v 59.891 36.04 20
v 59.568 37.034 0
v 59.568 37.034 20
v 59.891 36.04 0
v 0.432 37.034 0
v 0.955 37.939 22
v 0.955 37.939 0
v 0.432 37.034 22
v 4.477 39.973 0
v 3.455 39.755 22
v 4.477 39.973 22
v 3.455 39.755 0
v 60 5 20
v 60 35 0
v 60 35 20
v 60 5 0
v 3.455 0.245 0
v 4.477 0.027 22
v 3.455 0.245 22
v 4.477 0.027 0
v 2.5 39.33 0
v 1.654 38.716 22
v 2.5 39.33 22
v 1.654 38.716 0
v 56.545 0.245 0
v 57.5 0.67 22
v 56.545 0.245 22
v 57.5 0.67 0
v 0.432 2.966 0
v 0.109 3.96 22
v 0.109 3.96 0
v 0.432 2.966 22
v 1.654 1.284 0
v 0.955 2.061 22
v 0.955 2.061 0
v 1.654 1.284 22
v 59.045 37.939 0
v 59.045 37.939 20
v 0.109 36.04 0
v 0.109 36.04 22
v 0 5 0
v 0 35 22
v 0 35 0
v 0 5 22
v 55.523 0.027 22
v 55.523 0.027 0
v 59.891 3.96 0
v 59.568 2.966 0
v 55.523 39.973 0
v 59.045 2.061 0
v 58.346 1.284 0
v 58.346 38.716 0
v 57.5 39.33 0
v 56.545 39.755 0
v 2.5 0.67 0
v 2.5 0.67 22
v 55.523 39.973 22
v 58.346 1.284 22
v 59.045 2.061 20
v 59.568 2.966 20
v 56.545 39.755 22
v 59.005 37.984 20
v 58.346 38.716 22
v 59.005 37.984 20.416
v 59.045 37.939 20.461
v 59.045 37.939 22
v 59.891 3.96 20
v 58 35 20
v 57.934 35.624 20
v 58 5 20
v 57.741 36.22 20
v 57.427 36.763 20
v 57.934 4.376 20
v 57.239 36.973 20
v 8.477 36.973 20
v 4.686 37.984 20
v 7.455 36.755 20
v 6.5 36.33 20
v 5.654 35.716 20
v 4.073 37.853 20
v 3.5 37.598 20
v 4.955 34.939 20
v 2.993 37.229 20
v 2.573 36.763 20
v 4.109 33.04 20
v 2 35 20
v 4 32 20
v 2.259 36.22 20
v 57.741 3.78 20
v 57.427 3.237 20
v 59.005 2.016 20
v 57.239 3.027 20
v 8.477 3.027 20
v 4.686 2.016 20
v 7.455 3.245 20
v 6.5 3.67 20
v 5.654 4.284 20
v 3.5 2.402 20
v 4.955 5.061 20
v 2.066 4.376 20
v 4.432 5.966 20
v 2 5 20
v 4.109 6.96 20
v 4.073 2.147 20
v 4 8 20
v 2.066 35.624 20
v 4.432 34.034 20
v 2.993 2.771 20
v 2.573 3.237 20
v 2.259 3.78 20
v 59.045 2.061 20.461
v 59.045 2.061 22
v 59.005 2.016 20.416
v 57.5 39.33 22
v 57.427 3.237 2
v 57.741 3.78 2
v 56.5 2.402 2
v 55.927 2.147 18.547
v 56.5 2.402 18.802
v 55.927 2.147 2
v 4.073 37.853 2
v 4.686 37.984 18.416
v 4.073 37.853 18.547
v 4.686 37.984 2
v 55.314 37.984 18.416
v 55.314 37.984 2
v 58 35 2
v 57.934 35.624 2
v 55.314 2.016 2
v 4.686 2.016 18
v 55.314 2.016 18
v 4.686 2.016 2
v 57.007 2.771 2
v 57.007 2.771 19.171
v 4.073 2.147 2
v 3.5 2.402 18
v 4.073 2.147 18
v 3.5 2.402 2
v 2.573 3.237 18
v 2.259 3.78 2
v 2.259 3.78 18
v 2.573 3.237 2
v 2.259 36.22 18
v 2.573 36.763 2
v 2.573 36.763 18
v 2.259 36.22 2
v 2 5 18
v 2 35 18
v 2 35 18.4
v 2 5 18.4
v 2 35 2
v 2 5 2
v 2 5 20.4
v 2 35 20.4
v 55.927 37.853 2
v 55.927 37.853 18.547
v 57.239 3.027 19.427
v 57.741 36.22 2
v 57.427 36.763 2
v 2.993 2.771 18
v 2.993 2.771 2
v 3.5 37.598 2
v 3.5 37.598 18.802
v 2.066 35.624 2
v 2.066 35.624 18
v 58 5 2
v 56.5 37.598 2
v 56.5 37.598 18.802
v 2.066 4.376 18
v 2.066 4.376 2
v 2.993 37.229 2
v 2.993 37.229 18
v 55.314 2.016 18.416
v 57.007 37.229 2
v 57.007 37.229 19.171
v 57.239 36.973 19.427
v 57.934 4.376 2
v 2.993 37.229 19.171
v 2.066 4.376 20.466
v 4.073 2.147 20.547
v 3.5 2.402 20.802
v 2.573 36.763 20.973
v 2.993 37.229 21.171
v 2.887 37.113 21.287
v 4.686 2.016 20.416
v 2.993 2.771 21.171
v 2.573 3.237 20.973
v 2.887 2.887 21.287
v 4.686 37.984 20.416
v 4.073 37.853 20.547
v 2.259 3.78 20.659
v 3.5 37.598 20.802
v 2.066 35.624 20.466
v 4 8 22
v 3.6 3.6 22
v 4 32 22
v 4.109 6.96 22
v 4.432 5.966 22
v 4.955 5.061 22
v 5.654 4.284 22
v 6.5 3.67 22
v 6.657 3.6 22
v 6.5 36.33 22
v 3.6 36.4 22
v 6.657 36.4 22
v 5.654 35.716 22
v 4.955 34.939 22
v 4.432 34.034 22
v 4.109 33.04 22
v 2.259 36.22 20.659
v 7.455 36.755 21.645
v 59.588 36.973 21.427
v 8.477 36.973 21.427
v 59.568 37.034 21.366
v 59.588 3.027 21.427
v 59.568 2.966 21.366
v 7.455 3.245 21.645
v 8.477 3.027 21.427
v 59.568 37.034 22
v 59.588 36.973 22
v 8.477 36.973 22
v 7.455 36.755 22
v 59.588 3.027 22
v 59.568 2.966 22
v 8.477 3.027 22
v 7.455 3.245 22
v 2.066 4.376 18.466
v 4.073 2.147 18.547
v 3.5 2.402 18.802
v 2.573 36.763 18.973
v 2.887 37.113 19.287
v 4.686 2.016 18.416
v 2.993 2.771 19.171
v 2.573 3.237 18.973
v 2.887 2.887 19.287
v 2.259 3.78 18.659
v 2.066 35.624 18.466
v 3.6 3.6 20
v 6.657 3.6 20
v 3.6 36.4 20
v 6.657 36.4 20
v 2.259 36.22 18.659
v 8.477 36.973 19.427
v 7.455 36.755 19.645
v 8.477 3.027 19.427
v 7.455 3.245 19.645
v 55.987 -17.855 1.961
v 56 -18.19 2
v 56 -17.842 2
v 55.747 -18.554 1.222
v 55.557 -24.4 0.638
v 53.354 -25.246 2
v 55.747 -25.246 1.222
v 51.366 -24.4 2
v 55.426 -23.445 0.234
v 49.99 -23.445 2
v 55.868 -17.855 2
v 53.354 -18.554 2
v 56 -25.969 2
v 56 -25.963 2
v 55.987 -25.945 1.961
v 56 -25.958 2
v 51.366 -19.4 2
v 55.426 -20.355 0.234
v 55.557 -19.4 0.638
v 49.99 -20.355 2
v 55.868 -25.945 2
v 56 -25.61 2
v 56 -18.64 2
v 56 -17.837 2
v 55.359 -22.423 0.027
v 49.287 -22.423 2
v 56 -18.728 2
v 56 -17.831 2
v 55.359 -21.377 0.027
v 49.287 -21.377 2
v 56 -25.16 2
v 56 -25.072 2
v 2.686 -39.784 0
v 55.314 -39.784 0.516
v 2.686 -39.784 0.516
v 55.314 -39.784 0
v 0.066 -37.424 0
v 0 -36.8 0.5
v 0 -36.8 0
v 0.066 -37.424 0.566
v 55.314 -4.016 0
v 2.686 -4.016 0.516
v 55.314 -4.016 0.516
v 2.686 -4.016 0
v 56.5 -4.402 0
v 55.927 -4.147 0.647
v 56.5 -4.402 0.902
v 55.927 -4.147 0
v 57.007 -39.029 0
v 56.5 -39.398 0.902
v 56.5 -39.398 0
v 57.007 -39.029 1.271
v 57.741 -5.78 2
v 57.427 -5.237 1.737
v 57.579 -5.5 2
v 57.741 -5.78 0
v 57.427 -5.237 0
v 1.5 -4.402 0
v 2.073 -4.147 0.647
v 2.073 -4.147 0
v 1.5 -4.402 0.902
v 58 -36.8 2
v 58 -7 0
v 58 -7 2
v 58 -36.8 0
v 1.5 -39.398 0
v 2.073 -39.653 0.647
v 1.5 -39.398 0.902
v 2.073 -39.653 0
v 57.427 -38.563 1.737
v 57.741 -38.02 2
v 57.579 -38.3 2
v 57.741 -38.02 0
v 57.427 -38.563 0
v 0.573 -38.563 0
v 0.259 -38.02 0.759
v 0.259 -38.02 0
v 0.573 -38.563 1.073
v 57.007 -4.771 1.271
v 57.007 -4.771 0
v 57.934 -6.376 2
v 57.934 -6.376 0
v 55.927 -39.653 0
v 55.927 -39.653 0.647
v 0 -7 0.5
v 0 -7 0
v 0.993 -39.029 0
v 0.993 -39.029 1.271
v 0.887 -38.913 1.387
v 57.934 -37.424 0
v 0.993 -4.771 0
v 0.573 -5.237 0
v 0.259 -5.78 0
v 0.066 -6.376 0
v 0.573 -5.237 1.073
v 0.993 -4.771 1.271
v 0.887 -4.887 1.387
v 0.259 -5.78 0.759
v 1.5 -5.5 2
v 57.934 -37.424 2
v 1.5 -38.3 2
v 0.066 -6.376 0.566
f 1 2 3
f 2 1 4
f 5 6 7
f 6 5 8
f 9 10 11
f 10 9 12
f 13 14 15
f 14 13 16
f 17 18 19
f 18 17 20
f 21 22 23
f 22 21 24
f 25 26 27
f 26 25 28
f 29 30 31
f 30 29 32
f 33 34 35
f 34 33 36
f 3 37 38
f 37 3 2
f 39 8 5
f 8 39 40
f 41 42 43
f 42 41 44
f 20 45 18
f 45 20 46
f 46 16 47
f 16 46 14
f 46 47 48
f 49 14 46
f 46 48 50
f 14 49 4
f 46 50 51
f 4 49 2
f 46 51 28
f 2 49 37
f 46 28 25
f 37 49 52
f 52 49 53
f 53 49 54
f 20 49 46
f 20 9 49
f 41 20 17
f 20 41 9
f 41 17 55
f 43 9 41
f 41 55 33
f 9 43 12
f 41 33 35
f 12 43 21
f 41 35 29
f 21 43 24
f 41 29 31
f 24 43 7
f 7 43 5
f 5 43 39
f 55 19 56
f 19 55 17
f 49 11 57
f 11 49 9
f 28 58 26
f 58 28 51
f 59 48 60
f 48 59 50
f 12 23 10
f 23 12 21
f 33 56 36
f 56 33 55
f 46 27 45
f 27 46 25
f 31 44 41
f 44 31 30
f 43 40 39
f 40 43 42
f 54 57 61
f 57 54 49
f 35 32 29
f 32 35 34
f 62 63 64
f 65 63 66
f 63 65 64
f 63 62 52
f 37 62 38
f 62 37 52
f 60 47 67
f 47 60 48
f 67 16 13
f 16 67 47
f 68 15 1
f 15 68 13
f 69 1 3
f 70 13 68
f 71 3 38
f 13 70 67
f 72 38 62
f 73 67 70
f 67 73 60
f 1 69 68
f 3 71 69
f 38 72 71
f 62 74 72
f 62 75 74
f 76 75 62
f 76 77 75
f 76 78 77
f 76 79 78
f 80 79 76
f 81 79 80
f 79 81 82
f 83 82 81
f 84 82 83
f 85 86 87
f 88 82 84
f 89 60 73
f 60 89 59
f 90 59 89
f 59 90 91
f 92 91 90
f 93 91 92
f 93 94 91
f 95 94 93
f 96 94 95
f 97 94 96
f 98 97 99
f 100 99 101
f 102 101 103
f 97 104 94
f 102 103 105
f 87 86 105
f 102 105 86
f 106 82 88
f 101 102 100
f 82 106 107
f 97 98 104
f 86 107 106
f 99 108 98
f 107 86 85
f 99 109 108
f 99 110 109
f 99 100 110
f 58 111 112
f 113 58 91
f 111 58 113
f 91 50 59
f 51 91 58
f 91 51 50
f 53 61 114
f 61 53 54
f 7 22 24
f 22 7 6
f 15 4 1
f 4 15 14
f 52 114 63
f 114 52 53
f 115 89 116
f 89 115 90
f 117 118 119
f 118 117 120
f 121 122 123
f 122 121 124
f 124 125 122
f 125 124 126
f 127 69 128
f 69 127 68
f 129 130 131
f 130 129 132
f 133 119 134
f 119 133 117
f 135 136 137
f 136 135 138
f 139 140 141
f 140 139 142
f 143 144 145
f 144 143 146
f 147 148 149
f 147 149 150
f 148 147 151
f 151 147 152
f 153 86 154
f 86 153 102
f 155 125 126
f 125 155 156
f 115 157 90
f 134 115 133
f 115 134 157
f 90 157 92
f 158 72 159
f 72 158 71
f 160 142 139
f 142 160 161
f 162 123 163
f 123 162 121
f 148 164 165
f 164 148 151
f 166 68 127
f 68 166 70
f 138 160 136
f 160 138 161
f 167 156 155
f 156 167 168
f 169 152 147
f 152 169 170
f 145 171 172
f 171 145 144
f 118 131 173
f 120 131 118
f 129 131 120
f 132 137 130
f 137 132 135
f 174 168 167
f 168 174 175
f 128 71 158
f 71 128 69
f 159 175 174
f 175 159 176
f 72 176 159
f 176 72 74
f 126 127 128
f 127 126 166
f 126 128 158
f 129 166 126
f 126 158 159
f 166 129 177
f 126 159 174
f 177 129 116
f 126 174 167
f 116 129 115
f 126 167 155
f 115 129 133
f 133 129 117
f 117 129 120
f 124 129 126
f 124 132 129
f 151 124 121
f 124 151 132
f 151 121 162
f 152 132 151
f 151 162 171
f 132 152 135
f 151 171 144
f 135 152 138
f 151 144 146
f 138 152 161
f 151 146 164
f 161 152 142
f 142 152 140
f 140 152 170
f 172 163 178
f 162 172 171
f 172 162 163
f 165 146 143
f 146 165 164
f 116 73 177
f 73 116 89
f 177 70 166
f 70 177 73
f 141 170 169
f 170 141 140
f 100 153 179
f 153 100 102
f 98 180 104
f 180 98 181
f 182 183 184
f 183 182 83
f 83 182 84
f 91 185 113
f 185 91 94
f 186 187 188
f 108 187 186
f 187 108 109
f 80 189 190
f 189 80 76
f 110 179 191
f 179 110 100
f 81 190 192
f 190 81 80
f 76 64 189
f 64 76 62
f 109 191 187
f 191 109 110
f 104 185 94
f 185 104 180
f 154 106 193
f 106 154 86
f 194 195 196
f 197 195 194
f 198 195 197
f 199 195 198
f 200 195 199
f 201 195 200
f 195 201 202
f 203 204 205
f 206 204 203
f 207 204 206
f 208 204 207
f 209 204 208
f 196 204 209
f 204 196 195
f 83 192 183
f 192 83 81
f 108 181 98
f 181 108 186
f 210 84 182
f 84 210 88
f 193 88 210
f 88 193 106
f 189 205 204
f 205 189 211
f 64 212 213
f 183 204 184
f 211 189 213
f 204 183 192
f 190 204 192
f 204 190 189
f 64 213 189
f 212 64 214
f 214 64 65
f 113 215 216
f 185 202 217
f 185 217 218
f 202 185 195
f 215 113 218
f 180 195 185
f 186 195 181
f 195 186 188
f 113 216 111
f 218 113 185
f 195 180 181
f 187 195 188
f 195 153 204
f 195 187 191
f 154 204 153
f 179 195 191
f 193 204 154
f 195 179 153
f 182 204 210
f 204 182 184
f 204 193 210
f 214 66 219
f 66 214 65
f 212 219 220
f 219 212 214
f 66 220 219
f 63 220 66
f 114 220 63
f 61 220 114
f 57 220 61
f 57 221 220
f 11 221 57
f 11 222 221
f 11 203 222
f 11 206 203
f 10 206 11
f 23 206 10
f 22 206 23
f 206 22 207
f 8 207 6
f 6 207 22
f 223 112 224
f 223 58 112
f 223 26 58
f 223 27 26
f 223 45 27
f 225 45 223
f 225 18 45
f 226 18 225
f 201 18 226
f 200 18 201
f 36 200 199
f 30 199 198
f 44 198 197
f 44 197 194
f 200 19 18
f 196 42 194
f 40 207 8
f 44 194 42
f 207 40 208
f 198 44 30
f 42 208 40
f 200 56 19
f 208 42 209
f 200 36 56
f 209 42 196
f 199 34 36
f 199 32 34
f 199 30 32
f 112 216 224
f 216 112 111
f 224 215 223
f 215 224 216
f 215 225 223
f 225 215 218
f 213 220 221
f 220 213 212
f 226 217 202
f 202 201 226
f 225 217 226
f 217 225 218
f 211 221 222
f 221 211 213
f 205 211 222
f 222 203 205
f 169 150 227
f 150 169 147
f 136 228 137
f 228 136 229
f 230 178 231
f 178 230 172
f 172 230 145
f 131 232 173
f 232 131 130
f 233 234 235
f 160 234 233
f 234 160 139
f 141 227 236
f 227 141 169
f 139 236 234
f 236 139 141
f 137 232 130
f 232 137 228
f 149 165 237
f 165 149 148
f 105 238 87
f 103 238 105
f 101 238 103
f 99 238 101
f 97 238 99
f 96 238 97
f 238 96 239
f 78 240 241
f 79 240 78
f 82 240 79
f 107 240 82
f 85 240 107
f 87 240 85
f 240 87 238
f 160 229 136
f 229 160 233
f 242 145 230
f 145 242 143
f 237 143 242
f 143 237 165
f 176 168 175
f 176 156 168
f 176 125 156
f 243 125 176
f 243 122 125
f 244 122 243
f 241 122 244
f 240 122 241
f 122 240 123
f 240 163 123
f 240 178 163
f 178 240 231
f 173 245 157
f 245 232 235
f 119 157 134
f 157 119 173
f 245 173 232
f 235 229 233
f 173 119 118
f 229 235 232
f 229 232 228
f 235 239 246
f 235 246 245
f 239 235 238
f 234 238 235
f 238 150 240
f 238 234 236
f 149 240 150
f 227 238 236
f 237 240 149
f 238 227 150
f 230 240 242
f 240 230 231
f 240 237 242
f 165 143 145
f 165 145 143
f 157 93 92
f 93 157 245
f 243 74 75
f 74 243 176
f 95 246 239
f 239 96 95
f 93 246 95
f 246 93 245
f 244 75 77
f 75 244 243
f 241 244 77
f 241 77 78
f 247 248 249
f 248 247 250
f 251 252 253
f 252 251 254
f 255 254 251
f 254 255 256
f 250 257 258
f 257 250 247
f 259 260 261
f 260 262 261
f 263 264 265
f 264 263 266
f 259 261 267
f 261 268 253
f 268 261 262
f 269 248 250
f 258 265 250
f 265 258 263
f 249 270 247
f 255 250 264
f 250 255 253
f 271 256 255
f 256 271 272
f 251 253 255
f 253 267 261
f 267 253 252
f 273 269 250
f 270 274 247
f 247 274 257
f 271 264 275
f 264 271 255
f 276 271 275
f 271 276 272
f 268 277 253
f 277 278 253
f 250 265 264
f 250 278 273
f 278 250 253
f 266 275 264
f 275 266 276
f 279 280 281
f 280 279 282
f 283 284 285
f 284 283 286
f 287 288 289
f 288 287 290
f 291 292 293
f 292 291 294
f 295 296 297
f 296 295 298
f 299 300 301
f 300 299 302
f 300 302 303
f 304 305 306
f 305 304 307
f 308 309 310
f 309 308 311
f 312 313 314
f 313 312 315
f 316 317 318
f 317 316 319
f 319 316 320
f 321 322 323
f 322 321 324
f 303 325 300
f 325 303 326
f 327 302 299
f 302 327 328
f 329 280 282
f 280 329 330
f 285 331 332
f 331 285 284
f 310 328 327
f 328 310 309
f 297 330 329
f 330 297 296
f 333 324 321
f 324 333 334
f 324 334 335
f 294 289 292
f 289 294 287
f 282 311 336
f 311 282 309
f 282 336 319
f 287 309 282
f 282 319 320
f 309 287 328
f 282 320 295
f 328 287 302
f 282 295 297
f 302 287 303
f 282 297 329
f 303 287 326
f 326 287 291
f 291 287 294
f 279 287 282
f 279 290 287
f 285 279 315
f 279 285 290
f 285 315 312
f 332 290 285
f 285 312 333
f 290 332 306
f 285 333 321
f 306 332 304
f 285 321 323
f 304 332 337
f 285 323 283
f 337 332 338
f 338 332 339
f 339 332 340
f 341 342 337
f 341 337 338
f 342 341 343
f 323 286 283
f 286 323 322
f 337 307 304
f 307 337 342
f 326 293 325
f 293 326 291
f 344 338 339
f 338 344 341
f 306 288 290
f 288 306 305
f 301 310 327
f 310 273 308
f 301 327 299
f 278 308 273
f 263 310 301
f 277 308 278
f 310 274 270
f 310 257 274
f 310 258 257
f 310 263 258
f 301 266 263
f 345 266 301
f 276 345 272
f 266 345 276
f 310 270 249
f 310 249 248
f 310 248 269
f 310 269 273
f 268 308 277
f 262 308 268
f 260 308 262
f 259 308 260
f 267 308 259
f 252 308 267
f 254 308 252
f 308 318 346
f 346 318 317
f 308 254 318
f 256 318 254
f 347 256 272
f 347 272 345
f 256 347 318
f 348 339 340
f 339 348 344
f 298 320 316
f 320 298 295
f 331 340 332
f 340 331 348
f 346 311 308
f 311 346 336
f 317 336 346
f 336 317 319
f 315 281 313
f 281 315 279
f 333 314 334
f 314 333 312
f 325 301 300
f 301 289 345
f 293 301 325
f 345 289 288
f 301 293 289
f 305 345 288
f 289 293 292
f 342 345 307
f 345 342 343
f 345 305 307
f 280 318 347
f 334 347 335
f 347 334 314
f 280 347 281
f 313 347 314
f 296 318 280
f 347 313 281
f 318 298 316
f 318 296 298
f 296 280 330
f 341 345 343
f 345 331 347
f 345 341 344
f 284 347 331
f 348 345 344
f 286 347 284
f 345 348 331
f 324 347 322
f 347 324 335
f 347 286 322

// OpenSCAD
itemsShown="both"; // [both,box,lid]
boxLength=60;
boxWidth=40;
boxHeight=22;
cornerRadius=5;
wallThickness=2;
bottomThickness=2;
lidThickness=2;
lidClearance=0.2;
lidEdgeThickness=0.5;
// Notch in the lid
withNotch=true;//true;//[true:false]

/* [Global] */
if (itemsShown=="box") showBox();
if (itemsShown=="lid") showLid();
if (itemsShown=="both"){showBox();showLid();}

module showLid(){
	translate ([0, -2*wallThickness, 0]) 
	roundBoxLid(l=boxLength-wallThickness,
				w=boxWidth-2*wallThickness-lidClearance,
				h=lidThickness,
				et=lidEdgeThickness,
				r=cornerRadius-wallThickness,
				notch=withNotch);
}

module showBox(){
	round_box(l=boxLength,
			  w=boxWidth,
			  h=boxHeight,
			  bt=bottomThickness,
			  wt=wallThickness,
			  lt=lidThickness,
			  r=cornerRadius);
}

module round_box(l=40,w=30,h=30,bt=2,wt=2,lt=2,r=5,){
	difference() { 
		round_cube(l=l,w=w,h=h-lt,r=r);
		translate ([wt, wt, bt]) 
		round_cube(l=l-wt*2,w=w-wt*2,h=h,r=r-wt);
	}
	//use two box rims. one to make a slope to support the lid
	roundBoxRim();
	translate ([0, 0, -wt]) roundBoxRim();
}

module roundBoxRim(l=boxLength,
				   w=boxWidth,
				   h=boxHeight,
				   et=lidEdgeThickness,
				   r=cornerRadius,
				   wt=wallThickness,
				   lt=lidThickness){
	difference() { 
		translate ([0, 0, h-lt]) 
		round_cube(l=l,w=w,h=lt,r=r);
		translate ([wt+lt,wt+lt-et*2,h-lt-0.1]) 
		round_cube(l=l*2,w=w-2*(wt+lt)+4*et,h=lt+0.2,r=r-wt+lt);

		//subtract out a lid to make the ledge
		translate ([wt, w-wt, h-lt-0.1])
		roundBoxLid(l=l*2,w=w-2*wt,h=lt+0.1,wt=wt,t=lt,et=0.5,r=r-wt,notch=false);
	}
}

module roundBoxLid(l=40,w=30,h=3,wt=2,t=2,et=0.5,r=5,notch=true){
	translate ([l, 0, 0]) 
	rotate (a = [0, 0, 180]) 
	difference(){
		round_cube(l=l,w=w,h=h,t=t,r=r);

		translate ([-1, 0, et]) rotate (a = [45, 0, 0])  cube (size = [l+2, h*2, h*2]); 
		translate ([-1, w, et]) rotate (a = [45, 0, 0])  cube (size = [l+2, h*2, h*2]); 
		translate ([l, -1, et]) rotate (a = [45, 0, 90]) cube (size = [w+2, h*2, h*2]); 
		if (notch==true){
			translate([2,w/2,h+0.001]) thumbNotch(10/2,72,t);
		}
	}
}

module thumbNotch(
	thumbR=12/2,
	angle=72,
	notchHeight=2){

	size=10*thumbR;

	rotate([0,0,90])
	difference(){
		translate([0,
					(thumbR*sin(angle)-notchHeight)/tan(angle),
					 thumbR*sin(angle)-notchHeight])
		rotate([angle,0,0])
		cylinder(r=thumbR,h=size,$fn=30);

		translate([-size,-size,0])
		cube(size*2);
	}
}

module round_cube(l=40,w=30,h=20,r=5,$fn=30){
	hull(){ 
		translate ([r, r, 0]) cylinder (h = h, r=r);
		translate ([r, w-r, 0]) cylinder (h = h, r=r);
		translate ([l-r,w-r, 0]) cylinder (h = h, r=r);
		translate ([l-r, r, 0]) cylinder (h = h, r=r);
	}
}
